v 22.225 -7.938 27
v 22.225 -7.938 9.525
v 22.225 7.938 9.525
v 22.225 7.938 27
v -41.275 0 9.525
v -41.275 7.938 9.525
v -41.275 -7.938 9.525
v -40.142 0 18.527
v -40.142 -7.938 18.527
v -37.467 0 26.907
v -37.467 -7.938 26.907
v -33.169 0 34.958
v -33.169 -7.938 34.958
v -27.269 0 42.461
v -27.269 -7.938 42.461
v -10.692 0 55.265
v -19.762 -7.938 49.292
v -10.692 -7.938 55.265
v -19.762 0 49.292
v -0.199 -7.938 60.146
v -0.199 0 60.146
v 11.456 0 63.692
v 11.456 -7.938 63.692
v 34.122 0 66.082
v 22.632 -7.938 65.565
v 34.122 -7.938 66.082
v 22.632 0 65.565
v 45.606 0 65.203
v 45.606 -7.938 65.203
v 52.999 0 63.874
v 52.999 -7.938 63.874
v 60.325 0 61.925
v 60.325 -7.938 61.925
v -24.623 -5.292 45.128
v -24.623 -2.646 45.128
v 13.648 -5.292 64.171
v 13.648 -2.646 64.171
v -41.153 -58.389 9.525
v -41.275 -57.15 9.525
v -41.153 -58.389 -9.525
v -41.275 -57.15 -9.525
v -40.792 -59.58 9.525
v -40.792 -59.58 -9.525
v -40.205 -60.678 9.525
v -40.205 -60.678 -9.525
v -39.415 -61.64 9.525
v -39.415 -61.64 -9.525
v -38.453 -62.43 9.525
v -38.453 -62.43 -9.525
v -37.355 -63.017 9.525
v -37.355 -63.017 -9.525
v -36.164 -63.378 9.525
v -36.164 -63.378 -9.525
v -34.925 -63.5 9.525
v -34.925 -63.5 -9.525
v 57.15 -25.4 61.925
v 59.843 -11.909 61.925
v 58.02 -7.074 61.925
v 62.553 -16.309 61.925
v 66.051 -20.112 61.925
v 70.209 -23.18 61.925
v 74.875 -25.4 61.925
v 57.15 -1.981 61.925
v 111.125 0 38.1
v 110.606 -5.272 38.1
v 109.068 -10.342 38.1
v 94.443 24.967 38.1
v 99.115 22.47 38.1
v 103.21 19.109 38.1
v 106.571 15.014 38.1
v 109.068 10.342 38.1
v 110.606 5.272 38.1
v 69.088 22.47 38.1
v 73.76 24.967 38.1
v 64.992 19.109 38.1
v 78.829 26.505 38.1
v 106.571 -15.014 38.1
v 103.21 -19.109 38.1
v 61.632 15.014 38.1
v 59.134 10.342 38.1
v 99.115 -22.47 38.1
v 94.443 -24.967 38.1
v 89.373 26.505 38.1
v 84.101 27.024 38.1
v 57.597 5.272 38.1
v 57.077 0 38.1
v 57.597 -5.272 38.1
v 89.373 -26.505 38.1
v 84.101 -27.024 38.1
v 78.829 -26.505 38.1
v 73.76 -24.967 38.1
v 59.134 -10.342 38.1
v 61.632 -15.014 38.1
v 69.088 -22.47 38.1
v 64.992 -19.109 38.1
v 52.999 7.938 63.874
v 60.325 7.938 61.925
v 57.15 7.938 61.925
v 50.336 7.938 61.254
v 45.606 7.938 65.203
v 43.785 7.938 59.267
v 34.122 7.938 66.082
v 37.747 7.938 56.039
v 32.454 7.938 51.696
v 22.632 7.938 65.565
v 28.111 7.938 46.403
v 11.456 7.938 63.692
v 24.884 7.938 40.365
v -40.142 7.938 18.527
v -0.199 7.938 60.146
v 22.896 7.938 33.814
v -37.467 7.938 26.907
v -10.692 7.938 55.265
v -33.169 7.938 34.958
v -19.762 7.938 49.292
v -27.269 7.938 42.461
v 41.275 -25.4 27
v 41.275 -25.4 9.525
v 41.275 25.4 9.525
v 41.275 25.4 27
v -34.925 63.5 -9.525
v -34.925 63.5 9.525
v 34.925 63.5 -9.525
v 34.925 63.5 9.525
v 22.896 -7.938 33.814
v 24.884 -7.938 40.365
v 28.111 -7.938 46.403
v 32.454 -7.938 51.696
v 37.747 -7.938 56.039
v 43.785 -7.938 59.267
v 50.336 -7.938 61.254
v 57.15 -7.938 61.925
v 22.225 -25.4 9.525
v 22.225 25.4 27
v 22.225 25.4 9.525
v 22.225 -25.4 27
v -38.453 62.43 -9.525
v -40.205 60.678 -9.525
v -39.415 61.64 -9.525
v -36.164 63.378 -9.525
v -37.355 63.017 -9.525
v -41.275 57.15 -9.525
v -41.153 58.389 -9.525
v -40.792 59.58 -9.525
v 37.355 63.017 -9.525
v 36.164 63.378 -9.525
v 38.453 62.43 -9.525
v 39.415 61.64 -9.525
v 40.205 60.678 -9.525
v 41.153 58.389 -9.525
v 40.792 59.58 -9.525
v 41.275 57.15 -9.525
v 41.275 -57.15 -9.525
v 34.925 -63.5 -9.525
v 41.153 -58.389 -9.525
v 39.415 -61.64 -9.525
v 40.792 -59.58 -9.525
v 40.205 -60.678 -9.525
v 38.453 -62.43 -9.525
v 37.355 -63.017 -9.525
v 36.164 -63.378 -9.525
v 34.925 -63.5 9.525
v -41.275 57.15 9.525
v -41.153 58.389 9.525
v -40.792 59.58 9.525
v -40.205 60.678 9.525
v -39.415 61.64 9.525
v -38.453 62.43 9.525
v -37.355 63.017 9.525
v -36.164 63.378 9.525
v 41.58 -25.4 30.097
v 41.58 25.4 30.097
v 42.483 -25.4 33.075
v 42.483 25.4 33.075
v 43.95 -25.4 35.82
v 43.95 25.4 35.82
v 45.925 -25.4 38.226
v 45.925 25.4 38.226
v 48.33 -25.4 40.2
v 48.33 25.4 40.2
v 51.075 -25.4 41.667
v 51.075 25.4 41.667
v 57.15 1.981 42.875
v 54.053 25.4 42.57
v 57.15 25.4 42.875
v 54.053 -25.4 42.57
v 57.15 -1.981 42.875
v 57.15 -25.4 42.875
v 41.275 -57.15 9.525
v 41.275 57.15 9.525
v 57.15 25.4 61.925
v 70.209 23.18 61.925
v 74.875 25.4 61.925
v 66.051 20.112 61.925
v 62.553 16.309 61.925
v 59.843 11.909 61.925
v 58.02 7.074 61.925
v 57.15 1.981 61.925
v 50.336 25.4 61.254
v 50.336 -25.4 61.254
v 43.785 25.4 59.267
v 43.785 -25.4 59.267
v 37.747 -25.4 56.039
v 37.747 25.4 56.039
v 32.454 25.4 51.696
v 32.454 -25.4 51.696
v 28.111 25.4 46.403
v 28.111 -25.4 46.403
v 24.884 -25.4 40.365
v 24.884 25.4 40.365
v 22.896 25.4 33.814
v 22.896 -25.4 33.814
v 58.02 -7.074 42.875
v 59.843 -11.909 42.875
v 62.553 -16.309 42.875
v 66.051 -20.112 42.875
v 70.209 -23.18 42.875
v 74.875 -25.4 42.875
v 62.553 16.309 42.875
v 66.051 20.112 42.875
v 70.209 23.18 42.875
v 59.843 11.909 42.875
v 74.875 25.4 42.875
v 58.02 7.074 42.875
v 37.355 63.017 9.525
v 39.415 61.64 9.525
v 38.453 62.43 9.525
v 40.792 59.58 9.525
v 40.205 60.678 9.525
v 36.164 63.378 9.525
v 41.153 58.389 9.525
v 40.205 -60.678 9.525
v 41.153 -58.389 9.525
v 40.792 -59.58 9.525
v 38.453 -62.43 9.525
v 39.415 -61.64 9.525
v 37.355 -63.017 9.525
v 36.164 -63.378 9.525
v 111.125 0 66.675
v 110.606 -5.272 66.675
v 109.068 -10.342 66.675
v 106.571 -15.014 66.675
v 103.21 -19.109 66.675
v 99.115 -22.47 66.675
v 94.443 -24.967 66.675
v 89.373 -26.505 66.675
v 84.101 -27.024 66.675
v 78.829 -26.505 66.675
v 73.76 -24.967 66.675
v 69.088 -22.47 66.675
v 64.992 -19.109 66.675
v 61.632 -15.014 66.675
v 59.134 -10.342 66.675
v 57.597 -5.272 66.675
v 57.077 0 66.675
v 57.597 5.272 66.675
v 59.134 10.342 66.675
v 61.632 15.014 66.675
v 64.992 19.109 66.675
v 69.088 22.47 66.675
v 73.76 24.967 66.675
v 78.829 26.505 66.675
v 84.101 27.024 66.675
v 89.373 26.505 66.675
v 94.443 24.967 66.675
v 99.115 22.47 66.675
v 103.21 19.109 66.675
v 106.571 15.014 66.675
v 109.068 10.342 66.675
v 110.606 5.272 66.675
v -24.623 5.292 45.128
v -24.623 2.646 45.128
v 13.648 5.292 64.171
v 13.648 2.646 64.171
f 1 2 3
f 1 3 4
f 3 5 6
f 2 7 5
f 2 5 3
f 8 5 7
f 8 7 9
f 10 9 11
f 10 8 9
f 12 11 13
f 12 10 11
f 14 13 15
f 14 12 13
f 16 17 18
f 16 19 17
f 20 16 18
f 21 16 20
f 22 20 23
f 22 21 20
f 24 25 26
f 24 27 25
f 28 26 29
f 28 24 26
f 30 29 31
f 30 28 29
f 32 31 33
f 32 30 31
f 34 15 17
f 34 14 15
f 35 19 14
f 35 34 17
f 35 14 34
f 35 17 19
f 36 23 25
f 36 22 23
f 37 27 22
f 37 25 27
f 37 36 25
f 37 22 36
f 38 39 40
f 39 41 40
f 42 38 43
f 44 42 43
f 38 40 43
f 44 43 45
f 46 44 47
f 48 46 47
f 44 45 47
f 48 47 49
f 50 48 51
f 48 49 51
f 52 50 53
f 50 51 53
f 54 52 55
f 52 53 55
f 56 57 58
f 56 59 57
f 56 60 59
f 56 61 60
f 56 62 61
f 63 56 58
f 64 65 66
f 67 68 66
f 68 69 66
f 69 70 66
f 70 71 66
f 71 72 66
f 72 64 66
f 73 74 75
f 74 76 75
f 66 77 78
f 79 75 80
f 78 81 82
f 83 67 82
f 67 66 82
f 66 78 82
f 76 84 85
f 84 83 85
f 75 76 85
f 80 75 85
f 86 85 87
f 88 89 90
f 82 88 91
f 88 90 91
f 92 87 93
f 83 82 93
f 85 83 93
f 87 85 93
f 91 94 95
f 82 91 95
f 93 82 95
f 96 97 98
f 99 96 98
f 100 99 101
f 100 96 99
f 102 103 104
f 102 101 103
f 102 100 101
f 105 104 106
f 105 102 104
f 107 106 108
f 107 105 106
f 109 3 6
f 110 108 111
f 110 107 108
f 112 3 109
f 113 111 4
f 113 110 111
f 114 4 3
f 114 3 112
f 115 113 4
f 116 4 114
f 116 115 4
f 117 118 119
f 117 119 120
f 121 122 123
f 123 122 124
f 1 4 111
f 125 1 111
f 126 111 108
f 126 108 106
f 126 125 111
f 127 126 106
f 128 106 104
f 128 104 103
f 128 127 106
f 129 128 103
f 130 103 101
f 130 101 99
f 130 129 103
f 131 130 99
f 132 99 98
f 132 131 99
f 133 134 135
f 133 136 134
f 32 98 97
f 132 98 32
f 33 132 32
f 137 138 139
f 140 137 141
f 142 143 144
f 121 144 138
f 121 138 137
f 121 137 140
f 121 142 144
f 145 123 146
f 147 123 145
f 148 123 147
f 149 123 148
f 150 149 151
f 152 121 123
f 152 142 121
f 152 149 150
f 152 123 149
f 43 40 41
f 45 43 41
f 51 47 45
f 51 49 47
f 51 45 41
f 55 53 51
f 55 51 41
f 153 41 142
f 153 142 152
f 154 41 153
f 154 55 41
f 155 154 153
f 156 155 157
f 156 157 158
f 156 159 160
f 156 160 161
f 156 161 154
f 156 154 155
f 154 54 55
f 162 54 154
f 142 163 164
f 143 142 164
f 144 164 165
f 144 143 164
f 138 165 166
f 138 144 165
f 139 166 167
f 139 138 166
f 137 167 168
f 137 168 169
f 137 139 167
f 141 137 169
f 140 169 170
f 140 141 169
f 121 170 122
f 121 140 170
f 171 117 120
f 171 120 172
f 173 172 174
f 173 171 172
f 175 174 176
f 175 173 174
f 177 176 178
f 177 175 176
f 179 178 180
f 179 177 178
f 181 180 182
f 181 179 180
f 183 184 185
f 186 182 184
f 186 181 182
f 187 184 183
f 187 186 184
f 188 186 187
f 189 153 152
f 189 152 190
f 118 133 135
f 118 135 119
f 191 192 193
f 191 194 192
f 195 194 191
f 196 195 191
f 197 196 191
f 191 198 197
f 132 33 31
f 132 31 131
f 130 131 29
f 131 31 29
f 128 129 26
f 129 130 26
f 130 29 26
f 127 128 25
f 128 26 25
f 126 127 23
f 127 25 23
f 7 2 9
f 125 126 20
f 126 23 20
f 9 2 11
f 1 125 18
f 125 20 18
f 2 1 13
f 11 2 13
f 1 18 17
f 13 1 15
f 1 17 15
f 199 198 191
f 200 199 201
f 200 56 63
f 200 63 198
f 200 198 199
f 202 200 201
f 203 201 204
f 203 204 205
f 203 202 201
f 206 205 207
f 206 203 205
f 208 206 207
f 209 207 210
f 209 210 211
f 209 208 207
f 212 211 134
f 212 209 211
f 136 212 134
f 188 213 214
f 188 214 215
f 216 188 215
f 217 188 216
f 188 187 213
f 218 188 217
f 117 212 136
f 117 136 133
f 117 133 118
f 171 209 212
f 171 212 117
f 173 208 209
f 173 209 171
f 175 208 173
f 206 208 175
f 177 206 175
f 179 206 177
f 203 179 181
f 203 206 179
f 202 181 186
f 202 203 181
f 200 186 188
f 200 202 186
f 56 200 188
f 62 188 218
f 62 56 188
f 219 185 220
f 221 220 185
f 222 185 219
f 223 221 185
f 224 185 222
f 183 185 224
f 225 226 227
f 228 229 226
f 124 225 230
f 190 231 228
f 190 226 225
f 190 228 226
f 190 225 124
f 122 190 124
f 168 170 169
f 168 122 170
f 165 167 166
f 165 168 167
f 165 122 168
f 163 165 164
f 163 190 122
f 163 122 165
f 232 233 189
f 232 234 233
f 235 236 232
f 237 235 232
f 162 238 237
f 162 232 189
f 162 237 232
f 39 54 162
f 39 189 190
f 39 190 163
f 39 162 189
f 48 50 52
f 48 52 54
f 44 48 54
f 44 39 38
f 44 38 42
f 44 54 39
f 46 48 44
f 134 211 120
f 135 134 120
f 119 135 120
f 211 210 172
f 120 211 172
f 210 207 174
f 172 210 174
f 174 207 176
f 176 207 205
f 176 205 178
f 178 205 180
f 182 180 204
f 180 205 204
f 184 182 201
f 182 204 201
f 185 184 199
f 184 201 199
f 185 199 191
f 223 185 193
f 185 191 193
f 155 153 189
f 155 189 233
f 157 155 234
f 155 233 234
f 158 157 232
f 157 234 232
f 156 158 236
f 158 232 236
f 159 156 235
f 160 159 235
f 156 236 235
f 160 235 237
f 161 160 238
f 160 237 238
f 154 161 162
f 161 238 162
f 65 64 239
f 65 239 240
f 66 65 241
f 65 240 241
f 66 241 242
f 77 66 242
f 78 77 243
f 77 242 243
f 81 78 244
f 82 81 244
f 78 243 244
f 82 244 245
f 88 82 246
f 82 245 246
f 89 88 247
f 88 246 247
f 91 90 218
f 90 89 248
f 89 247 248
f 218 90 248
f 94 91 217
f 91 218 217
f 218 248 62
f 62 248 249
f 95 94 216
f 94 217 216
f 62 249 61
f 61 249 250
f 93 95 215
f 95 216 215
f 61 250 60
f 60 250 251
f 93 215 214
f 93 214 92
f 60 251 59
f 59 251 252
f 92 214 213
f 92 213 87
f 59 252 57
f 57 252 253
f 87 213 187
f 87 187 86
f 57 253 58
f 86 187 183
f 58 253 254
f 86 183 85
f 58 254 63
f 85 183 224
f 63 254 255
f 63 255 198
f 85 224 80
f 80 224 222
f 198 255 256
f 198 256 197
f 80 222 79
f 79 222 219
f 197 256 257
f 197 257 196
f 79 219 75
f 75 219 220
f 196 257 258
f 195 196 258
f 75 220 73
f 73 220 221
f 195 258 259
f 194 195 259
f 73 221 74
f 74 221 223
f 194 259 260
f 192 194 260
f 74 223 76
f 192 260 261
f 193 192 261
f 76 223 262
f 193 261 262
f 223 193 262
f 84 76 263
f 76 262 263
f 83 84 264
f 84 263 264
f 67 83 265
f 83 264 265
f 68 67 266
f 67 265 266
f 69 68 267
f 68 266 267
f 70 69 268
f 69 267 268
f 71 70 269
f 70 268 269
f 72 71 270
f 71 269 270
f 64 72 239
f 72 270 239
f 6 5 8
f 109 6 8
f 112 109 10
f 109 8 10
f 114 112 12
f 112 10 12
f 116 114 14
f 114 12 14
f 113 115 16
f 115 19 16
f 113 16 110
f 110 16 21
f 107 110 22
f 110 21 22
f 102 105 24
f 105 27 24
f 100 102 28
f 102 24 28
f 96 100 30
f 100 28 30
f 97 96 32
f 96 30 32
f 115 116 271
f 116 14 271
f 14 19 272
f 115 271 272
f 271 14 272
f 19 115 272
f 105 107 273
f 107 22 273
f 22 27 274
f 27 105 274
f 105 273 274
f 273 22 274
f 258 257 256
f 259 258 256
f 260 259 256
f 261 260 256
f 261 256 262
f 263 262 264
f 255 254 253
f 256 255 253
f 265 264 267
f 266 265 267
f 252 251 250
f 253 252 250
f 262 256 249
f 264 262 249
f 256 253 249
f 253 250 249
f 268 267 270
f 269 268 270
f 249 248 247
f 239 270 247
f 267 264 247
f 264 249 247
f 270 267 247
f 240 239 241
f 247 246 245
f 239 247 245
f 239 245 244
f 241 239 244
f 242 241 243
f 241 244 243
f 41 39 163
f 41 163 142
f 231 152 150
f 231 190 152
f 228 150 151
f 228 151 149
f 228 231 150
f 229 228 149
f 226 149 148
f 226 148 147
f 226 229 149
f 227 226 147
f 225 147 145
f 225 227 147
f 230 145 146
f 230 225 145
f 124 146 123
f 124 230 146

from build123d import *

# Parameters (mm, degrees)
F1_DEPTH = 63.5
F2_DEPTH = 25.4
F0_W     = 23.776155
F0_H     = 19.05
F3_DEPTH = 25.4
F5_DEPTH = 7.9375
F6_R     = 6.35


with BuildPart() as f1:
    # F0 (on Front) → F1 (new body, symmetric)
    with BuildSketch(Plane.XZ):
        Polygon((22.225, 9.525), (-41.275, 9.525), (-41.275, -9.525), (41.275, -9.525), (41.275, 9.525), align=None)
    extrude(amount=F1_DEPTH, both=True)

    # F6
    f6_edges = [f1.edges().sort_by_distance(p)[0] for p in [
        (41.275, -63.5, 0),
        (-41.275, -63.5, 0),
        (-41.275, 63.5, 0),
        (41.275, 63.5, 0),
    ]]
    fillet(f6_edges, radius=F6_R)


with BuildPart() as f2:
    # F0 (on Front) → F2 (new body, symmetric)
    with BuildSketch(Plane.XZ):
        with BuildLine():
            Line((22.225, 27.0002), (22.225, 9.525))
            Line((22.225, 9.525), (41.275, 9.525))
            Line((41.275, 9.525), (41.275, 27.0002))
            ThreePointArc((41.275, 27.0002), (45.92468, 38.22552), (57.15, 42.8752))
            Line((57.15, 42.8752), (60.325, 42.8752))
            Line((60.325, 42.8752), (60.325, 61.9252))
            Line((60.325, 61.9252), (57.15, 61.9252))
            ThreePointArc((57.15, 61.9252), (32.454296, 51.695904), (22.225, 27.0002))
        make_face()
    extrude(amount=F2_DEPTH, both=True)

    # F0 (on Front) → F3 (join, symmetric)
    with BuildSketch(Plane.XZ):
        with Locations((72.213077, 52.4002)):
            Rectangle(F0_W, F0_H)
    extrude(amount=F3_DEPTH, both=True)

    # F0 (on Front) → F4 (revolve)
    with BuildSketch(Plane.XZ):
        Polygon((84.101155, 66.675), (84.101155, 61.9252), (84.101155, 42.8752), (84.101155, 38.1), (111.125, 38.1), (111.125, 66.675), align=None)
    revolve(axis=Axis((84.101155, 0, 52.3875), (0, 0, -1)))


with BuildPart() as f5:
    # F0 (on Front) → F5 (new body, symmetric)
    with BuildSketch(Plane.XZ):
        with BuildLine():
            add(Edge.make_bspline(
                [(-41.275, 9.525), (-39.837386, 51.831443), (13.850276, 76.390699), (60.325, 61.9252)],
                knots=[0, 0, 0, 0, 114.316845, 114.316845, 114.316845, 114.316845], degree=3))
            Line((-41.275, 9.525), (22.225, 9.525))
            Line((22.225, 9.525), (22.225, 27.0002))
            ThreePointArc((22.225, 27.0002), (32.454296, 51.695904), (57.15, 61.9252))
            Line((57.15, 61.9252), (60.325, 61.9252))
        make_face()
    extrude(amount=F5_DEPTH, both=True)


solid = Compound([f1.part, f2.part, f5.part])
